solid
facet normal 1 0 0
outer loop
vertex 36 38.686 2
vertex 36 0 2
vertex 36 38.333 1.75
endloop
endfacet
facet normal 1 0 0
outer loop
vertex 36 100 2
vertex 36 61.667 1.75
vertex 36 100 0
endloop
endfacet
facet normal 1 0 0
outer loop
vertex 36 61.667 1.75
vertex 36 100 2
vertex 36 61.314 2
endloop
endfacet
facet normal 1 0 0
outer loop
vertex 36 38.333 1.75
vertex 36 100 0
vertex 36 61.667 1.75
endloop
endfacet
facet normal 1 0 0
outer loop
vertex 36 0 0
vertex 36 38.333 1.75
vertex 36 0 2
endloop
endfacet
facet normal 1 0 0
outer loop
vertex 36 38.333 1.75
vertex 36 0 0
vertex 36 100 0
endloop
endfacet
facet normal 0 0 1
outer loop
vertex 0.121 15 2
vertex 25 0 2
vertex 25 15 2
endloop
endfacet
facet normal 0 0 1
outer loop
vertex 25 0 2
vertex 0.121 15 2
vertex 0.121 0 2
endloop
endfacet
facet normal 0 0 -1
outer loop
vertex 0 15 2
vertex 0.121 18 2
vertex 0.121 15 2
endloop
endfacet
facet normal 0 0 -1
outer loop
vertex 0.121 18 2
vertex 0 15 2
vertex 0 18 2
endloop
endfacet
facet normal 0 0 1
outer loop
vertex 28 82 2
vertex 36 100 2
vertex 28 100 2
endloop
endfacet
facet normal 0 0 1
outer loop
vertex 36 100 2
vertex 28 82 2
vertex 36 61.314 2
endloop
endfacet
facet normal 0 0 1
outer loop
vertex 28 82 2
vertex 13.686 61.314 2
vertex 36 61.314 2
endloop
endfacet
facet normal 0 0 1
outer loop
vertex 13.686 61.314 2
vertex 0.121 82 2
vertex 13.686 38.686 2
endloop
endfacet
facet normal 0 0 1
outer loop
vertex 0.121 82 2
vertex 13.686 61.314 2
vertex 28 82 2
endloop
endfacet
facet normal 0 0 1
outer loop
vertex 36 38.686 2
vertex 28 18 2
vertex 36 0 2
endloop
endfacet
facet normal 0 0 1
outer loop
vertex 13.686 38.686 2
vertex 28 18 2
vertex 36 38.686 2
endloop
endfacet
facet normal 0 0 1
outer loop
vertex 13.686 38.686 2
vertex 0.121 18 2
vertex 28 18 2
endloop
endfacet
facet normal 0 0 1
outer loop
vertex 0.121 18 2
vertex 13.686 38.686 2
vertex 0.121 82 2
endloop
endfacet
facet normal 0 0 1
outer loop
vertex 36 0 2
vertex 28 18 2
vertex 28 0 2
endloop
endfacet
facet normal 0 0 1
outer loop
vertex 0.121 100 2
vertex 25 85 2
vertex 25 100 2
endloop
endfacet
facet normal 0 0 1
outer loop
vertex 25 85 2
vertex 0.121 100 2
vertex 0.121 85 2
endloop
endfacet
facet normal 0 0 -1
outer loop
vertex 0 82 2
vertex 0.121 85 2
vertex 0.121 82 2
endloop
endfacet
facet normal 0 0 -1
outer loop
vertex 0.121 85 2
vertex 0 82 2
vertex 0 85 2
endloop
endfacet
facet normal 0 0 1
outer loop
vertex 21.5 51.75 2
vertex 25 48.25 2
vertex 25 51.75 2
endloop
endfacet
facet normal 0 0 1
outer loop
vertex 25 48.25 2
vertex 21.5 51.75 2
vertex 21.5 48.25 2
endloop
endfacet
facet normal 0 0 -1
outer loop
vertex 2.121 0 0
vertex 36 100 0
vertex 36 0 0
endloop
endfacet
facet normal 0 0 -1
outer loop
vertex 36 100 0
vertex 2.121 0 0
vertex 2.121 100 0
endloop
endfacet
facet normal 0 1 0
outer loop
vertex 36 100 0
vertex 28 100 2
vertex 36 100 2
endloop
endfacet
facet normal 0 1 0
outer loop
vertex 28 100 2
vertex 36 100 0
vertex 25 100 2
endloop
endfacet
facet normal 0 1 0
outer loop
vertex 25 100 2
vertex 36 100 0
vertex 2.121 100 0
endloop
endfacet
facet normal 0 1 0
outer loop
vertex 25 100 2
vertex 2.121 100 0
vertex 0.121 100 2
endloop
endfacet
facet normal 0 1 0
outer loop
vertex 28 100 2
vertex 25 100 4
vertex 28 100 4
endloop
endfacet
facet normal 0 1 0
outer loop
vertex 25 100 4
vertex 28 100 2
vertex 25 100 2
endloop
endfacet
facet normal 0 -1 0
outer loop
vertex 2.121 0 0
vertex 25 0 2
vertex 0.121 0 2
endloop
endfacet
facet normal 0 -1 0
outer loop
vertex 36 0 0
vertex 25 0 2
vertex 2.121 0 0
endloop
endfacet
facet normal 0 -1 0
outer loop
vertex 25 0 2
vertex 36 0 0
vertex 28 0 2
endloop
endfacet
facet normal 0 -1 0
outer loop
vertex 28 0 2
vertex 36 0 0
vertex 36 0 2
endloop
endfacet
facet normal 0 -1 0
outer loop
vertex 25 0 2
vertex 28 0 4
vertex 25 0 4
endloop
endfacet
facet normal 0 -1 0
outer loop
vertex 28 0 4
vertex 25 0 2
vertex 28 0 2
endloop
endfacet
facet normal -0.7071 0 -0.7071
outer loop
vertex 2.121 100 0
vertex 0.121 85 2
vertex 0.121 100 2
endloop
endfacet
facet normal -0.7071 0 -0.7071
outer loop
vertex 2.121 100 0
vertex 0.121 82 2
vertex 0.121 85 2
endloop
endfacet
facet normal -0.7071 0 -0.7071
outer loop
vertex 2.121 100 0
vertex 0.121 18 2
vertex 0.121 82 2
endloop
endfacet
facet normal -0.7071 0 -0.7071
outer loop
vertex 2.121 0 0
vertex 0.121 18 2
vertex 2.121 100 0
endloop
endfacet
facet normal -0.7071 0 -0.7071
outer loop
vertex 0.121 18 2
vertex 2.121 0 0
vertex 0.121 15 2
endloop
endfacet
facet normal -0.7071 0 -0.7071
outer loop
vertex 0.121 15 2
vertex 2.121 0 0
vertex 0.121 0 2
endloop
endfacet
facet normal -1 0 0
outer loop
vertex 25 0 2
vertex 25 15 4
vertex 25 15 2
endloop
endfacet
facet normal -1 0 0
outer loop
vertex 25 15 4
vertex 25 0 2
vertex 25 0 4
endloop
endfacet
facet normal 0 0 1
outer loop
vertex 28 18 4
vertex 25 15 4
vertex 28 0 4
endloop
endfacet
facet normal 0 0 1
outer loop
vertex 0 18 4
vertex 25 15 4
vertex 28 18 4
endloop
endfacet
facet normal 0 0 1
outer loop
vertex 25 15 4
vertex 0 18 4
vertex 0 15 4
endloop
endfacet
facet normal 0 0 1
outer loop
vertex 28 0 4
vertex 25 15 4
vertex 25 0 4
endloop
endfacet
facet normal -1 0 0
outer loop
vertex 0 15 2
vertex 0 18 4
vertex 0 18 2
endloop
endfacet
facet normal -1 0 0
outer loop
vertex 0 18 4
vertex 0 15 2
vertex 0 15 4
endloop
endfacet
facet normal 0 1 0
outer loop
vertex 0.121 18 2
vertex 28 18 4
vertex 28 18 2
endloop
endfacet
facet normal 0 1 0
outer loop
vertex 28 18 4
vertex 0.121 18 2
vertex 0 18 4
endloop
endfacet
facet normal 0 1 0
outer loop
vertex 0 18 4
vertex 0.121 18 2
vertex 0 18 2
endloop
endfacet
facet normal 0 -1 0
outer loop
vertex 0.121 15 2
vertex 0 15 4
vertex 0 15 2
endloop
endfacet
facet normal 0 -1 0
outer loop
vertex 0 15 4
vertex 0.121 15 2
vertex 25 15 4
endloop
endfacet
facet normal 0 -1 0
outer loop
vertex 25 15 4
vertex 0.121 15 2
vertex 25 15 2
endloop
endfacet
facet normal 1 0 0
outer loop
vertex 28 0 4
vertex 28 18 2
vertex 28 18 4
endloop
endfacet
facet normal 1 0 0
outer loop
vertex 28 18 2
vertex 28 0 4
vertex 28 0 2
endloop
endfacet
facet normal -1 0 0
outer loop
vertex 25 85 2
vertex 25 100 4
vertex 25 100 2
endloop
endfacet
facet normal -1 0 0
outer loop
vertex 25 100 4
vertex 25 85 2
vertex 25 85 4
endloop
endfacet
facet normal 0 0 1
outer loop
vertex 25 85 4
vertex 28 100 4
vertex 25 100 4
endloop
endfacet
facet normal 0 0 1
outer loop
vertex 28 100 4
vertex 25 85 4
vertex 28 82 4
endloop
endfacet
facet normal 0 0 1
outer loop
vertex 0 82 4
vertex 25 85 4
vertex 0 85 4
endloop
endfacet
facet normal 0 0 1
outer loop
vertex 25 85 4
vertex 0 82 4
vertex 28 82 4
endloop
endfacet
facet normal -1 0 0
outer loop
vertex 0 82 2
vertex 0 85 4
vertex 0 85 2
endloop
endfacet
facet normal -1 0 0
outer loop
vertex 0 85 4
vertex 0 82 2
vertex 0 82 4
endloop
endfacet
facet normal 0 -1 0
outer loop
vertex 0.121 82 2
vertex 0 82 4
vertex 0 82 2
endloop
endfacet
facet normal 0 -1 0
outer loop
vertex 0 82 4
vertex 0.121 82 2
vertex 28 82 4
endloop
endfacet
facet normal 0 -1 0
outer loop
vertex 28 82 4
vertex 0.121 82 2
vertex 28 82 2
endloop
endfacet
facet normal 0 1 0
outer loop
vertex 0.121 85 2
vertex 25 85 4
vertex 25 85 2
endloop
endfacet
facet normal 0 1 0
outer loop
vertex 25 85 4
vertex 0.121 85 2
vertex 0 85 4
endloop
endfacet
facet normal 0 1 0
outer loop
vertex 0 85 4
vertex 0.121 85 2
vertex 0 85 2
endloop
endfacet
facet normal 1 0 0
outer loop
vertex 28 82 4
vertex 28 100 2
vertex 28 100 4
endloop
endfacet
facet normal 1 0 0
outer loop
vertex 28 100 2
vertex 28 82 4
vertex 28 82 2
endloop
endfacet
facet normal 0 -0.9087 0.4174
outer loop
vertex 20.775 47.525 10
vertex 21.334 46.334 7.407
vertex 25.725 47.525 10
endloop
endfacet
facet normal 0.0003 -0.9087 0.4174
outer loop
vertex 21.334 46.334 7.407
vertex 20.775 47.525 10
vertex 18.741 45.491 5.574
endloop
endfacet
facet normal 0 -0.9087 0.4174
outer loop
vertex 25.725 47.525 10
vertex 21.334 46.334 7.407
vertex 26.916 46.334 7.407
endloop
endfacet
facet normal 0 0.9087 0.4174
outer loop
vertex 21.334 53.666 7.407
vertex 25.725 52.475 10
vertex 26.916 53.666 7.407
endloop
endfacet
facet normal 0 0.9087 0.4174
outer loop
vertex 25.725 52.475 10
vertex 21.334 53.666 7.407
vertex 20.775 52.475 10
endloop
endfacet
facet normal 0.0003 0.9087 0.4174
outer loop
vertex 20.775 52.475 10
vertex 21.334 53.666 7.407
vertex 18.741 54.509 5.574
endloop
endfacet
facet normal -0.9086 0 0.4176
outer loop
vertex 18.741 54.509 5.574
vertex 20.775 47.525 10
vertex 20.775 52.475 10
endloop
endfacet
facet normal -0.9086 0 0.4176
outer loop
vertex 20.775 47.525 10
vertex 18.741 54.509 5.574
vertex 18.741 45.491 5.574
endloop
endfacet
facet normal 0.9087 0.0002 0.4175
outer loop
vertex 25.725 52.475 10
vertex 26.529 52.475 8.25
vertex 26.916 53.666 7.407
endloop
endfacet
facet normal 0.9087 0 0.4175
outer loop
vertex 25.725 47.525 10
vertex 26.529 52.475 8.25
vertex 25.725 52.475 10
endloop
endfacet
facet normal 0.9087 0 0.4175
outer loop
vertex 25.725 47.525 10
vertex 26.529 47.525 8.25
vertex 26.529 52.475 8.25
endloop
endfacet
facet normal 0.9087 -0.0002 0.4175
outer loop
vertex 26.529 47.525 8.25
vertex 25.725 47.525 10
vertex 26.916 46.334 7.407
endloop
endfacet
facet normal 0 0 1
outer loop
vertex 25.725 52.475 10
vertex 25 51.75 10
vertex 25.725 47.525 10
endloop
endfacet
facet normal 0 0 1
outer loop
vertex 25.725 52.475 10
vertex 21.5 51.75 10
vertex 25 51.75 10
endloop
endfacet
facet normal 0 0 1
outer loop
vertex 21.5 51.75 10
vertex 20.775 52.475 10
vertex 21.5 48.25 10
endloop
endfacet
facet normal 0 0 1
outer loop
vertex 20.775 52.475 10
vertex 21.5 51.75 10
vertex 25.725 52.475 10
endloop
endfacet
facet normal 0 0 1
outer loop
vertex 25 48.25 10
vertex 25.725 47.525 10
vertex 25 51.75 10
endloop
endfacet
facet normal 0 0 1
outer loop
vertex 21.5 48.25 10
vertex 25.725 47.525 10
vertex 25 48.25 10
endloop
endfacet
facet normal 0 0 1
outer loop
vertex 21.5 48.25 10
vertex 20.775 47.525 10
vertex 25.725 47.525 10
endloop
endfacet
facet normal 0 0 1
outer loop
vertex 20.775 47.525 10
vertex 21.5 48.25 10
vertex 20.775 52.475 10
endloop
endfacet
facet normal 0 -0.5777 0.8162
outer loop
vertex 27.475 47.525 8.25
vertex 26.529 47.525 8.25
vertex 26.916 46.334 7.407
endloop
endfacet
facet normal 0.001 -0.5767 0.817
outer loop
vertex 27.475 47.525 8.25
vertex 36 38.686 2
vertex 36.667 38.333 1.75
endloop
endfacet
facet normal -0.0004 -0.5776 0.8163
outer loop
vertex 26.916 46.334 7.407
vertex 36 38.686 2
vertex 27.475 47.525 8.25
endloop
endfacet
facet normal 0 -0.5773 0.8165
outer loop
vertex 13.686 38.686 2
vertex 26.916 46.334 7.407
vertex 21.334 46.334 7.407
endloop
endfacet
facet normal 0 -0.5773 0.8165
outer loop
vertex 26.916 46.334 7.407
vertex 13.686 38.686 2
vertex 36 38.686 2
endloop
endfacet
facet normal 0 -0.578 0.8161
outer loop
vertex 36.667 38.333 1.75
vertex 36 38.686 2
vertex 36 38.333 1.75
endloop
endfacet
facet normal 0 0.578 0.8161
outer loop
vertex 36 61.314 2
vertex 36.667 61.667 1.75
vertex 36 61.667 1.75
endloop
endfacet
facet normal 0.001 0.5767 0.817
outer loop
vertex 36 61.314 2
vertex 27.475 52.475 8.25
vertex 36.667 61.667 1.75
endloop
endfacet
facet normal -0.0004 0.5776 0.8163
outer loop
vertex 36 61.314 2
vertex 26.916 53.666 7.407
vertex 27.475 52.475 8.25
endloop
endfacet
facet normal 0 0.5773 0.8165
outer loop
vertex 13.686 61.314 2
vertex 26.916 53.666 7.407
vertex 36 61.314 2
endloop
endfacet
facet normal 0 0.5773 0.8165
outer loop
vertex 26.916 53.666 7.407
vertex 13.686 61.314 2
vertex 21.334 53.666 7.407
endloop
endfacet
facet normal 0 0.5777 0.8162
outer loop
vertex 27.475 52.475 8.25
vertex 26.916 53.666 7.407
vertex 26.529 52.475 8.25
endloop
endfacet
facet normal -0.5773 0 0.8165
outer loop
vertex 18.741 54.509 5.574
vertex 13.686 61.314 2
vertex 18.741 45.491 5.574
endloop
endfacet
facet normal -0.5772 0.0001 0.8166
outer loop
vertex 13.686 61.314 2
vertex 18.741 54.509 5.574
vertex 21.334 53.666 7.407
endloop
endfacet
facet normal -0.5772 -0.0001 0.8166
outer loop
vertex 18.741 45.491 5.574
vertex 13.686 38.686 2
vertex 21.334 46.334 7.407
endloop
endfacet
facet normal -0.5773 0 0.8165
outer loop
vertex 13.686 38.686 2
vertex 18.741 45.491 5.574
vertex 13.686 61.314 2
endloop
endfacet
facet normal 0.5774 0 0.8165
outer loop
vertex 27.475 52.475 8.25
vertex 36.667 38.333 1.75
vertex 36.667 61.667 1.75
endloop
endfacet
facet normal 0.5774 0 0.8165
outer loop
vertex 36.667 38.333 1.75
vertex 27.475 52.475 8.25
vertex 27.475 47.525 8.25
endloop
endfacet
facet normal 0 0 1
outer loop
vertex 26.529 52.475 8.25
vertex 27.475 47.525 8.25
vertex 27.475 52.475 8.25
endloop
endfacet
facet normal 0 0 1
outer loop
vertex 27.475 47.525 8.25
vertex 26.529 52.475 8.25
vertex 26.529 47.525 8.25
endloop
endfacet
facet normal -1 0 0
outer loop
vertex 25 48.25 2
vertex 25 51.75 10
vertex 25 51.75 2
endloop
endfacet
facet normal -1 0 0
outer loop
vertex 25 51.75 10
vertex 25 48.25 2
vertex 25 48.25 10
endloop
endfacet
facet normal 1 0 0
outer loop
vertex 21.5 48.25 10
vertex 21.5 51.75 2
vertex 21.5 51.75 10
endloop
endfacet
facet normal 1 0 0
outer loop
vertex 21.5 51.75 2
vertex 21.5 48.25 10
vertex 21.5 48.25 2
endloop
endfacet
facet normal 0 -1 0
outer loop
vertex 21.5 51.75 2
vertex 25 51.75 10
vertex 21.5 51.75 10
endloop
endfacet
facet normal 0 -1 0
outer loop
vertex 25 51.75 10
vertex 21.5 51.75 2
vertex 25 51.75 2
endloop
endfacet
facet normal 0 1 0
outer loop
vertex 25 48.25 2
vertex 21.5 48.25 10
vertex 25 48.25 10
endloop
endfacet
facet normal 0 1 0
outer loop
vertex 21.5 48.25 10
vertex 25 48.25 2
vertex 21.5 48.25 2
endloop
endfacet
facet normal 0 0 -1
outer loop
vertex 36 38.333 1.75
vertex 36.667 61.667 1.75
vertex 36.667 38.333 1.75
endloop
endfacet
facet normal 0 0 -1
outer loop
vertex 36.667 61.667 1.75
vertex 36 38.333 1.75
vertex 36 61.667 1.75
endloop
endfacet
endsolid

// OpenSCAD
// -------- Este módulo fue creado por Fernando Castro 	--------
// -------- on the 10/08/2016 y está disponible  para ser distribuido sin restricciones.

// Elementos que componen el carro

render_part(2);
module render_part(part_to_render) {
	if (part_to_render == 1) pestania();
    if (part_to_render == 2) basecompleta();
    if (part_to_render == 3) vastago();
}

// Dimensiones de la pestaña
ancho_p=15;
largo_p=25;
espesor_p=2;

// Dimensiones de la base del carro
ancho_b=35;
largo_b=100;
espesor_b=2;
    //Dimensiones soporte para pesos
    vastago_b=3.5;
    vastago_h=20;
    base=10;
    altura=10; 

module base(){
difference(){
cube(size=[ancho_b+espesor_b/2,largo_b,espesor_b]);
color("red")
rotate([0,-45,0])
cube(size=[espesor_b+espesor_b/2,largo_b*2+2,espesor_b*2],center=true);
}}

module traba_p()
{union(){
    color("red")
translate([0,ancho_p,espesor_b])
cube(size=[largo_p,espesor_p+1,espesor_p]);
color("red")
translate([largo_p,0,espesor_b])
cube(size=[espesor_p+1,ancho_p+espesor_p+1,espesor_p]);
}}

module soporte(){
color("green")
translate([ancho_b-base,largo_b/2,0])
difference(){
union(){
translate([-vastago_b/2,0,0])
rotate([0,0,45])
cylinder(altura,base,vastago_b,$fn=4);
rotate([0,0,45])
cylinder(altura-vastago_b/2,base*2,vastago_b,$fn=4);
}
translate([-vastago_b/2,0,0])
cube(size=[vastago_b,vastago_b,altura*2],center=true);
translate([base,0,0])
cube(size=[vastago_b*4,base*4,vastago_b],center=true);
}}
module basecompleta(){
union(){
base();
traba_p();
mirror([0,1,0])
translate([0,-largo_b,0])
traba_p();
soporte();
}}

module pestania(){
rotate([90,0,0])
union(){
    cube(size=[largo_p,ancho_p,espesor_p]);
translate([largo_p,0,0])
    rotate([0,-45,0])
cube(size=[largo_p,ancho_p,espesor_p]);
}}
module vastago(){
    rotate([90,0,0])
    cube(size=[vastago_b,vastago_b,vastago_h]);
    }
